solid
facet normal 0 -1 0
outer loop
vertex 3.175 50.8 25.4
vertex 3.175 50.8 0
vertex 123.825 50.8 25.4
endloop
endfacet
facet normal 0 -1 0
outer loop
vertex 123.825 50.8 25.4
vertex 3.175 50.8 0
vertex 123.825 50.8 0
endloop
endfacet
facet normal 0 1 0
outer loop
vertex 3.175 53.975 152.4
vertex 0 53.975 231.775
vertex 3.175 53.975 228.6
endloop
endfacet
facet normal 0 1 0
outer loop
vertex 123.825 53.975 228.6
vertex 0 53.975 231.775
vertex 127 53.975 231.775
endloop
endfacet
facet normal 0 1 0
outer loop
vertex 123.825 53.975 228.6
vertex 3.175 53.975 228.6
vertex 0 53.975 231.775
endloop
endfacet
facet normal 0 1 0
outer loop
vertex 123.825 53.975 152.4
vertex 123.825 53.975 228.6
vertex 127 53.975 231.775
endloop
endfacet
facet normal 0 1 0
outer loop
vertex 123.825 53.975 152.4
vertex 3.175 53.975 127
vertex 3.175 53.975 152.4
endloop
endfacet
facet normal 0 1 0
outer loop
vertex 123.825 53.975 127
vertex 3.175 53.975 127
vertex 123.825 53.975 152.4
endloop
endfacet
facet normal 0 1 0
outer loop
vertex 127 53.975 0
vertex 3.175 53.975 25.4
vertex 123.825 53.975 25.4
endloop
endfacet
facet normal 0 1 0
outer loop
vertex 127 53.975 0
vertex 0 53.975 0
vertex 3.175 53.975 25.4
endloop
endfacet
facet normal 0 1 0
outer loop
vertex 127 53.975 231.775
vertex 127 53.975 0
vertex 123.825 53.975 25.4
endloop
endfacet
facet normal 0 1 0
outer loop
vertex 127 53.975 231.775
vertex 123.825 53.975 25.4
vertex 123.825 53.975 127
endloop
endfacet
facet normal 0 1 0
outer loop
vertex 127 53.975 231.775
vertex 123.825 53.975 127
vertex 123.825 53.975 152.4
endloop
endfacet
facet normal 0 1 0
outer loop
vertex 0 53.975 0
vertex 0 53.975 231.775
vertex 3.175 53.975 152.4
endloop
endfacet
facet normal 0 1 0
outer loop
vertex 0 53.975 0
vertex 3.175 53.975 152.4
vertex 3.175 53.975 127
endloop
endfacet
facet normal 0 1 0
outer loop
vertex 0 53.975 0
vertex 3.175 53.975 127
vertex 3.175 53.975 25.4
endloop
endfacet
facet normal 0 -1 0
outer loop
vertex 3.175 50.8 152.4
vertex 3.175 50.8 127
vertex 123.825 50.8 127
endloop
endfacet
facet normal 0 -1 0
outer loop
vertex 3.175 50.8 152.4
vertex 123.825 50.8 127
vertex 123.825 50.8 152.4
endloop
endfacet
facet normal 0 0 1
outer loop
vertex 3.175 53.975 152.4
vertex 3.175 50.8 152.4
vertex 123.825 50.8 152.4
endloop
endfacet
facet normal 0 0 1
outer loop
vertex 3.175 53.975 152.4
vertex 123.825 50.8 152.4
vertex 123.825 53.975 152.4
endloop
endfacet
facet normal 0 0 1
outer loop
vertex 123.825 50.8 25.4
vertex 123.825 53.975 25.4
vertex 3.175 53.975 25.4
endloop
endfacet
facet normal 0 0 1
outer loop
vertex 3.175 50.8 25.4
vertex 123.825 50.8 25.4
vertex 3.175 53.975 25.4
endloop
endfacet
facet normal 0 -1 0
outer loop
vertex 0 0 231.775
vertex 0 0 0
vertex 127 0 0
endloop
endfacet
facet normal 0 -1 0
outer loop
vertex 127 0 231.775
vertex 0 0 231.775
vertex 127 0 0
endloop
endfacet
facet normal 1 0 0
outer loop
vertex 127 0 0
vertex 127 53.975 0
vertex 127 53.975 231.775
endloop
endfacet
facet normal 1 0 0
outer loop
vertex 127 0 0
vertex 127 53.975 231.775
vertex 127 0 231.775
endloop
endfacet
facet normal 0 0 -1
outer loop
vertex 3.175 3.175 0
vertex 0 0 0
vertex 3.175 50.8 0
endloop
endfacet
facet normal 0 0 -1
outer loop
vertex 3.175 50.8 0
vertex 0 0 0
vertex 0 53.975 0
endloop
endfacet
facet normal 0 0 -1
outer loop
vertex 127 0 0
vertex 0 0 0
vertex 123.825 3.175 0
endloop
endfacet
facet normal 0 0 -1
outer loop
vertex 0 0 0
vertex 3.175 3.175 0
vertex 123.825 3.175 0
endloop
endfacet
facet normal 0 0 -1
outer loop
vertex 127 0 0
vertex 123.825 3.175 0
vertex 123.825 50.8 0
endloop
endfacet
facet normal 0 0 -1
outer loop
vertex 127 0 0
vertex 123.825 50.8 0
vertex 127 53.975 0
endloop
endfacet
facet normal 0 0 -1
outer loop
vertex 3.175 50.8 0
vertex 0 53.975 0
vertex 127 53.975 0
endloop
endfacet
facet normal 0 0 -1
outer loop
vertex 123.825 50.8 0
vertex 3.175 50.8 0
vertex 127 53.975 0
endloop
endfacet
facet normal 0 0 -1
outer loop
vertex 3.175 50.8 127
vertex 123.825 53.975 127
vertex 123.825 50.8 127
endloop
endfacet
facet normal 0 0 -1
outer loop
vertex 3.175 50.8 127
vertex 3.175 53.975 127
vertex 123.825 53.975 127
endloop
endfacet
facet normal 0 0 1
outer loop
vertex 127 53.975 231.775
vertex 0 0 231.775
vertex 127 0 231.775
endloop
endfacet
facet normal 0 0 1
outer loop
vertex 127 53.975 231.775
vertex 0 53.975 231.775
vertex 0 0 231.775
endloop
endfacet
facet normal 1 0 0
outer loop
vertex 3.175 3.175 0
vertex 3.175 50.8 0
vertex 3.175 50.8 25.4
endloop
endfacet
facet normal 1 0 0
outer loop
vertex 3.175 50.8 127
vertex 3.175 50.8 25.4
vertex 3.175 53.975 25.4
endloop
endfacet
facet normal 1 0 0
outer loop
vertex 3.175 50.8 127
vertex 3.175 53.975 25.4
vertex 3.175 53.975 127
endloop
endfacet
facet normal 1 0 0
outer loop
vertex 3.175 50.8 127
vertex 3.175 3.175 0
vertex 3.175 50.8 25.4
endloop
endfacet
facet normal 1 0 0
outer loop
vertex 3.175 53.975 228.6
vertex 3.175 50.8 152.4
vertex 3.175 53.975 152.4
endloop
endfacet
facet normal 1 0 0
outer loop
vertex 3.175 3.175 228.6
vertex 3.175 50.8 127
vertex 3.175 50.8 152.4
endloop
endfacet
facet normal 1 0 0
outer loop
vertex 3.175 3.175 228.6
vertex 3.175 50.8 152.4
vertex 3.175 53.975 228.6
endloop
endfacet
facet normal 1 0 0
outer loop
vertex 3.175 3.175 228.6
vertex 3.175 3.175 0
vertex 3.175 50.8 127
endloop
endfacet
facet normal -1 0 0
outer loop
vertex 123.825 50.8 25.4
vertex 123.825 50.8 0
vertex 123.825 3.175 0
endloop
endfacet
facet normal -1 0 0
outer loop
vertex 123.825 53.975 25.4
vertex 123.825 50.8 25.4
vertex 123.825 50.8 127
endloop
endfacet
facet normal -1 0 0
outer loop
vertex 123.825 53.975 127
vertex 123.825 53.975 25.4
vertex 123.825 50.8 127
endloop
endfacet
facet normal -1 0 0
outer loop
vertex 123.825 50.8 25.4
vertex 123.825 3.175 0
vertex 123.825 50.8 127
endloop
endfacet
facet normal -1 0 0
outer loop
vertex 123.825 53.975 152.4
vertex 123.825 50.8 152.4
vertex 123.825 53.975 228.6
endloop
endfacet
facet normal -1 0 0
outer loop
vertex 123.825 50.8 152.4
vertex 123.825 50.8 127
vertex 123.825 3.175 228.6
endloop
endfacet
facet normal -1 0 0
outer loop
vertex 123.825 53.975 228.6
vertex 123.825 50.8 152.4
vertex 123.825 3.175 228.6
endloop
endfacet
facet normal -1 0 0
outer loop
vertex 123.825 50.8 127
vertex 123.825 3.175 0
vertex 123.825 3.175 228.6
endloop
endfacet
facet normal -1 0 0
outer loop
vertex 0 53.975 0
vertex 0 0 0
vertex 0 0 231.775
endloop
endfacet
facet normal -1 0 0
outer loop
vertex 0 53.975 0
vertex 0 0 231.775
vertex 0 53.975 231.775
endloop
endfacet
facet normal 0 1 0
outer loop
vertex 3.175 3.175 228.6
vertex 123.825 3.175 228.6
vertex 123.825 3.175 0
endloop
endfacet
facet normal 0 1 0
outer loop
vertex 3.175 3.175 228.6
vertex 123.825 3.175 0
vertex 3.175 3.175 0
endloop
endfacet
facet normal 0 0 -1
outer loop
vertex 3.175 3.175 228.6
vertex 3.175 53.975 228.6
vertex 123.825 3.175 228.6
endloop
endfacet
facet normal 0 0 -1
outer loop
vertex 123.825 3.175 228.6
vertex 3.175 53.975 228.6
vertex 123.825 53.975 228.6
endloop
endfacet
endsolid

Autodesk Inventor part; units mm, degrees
ref_plane "YZ Plane" through (0, 0, 0) normal (1, 0, 0) x (0, 1, 0)
ref_plane "XZ Plane" through (0, 0, 0) normal (0, 1, 0) x (-1, 0, 0)
ref_plane "XY Plane" through (0, 0, 0) normal (0, 0, 1) x (1, 0, 0)
sketch "Sketch1" plane through (0, 0, 0) normal (0, 1, 0) x (-1, 0, 0)
  line L0 (0, 0) -> (-127, 0)
  line L1 (-127, 0) -> (-127, 228.6)
  line L2 (-127, 228.6) -> (0, 228.6)
  line L3 (0, 228.6) -> (0, 0)
  dimension "d0" = 127
  dimension "d1" = 228.6
extrude "Extrusion1" add sketch "Sketch1" along normal blind 3.175
sketch "Sketch2" plane through (0, 3.175, 0) normal (0, 1, 0) x (1, 0, 0)
  line L0 (0, 0) -> (0, -228.6) projected
  line L1 (0, 0) -> (3.175, 0)
  line L2 (3.175, 0) -> (3.175, -228.6)
  line L3 (3.175, -228.6) -> (0, -228.6)
  line L4 (0, -228.6) -> (0, 0)
  dimension "d4" = 3.175
  dimension "d5" = 228.6
extrude "Extrusion2" add sketch "Sketch2" along normal blind 50.8
sketch "Sketch3" plane through (0, 3.175, 0) normal (0, 1, 0) x (1, 0, 0)
  line L0 (127, -228.6) -> (127, 0) projected
  line L1 (127, 0) -> (123.825, 0)
  line L2 (123.825, 0) -> (123.825, -228.6)
  line L3 (123.825, -228.6) -> (127, -228.6)
  line L4 (127, -228.6) -> (127, 0)
  point P0 (0, 0)
  dimension "d8" = 3.175
  dimension "d9" = 228.6
extrude "Extrusion3" add sketch "Sketch3" along normal blind 50.8
sketch "Sketch6" plane through (0, 0, 228.6) normal (0, 0, 1) x (1, 0, 0)
  line L0 (0, 0) -> (127, 0) projected
  line L1 (0, 53.975) -> (127, 53.975)
  line L2 (127, 53.975) -> (127, 0)
  line L3 (127, 0) -> (0, 0)
  line L4 (0, 0) -> (0, 53.975)
extrude "Extrusion4" add sketch "Sketch6" along normal blind 3.175
sketch "Sketch7" plane through (3.175, 3.175, 0) normal (1, 0, 0) x (0, 0, -1)
  line L0 (-228.6, 50.8) -> (-152.4, 50.8) construction
  line L1 (0, 50.8) -> (-231.775, 50.8) construction
  line L2 (-228.6, 50.8) -> (-152.4, 50.8) construction
  line L3 (-152.4, 50.8) -> (-127, 50.8)
  line L4 (-127, 50.8) -> (-127, 47.625)
  line L5 (-127, 47.625) -> (-152.4, 47.625)
  line L6 (-152.4, 47.625) -> (-152.4, 50.8)
  point P0 (0, -3.175)
  dimension "d19" = 76.2
  dimension "d20" = 0
  dimension "d21" = 25.4
  dimension "d22" = 3.175
extrude "Extrusion5" add sketch "Sketch7" along normal blind 120.65
sketch "Sketch8" plane through (0, 53.975, 0) normal (0, 1, 0) x (1, 0, 0)
  line L0 (3.175, -127) -> (3.175, 0) projected
  line L1 (3.175, 0) -> (123.825, 0)
  line L2 (123.825, 0) -> (123.825, -25.4)
  line L3 (123.825, -25.4) -> (3.175, -25.4)
  line L4 (3.175, -25.4) -> (3.175, 0)
  point P0 (0, 0)
  point P1 (3.175, -25.4)
  dimension "d25" = 120.65
  dimension "d26" = 25.4
extrude "Extrusion6" add sketch "Sketch8" against normal blind 3.175
properties part number "ShootingMech_Housing"
